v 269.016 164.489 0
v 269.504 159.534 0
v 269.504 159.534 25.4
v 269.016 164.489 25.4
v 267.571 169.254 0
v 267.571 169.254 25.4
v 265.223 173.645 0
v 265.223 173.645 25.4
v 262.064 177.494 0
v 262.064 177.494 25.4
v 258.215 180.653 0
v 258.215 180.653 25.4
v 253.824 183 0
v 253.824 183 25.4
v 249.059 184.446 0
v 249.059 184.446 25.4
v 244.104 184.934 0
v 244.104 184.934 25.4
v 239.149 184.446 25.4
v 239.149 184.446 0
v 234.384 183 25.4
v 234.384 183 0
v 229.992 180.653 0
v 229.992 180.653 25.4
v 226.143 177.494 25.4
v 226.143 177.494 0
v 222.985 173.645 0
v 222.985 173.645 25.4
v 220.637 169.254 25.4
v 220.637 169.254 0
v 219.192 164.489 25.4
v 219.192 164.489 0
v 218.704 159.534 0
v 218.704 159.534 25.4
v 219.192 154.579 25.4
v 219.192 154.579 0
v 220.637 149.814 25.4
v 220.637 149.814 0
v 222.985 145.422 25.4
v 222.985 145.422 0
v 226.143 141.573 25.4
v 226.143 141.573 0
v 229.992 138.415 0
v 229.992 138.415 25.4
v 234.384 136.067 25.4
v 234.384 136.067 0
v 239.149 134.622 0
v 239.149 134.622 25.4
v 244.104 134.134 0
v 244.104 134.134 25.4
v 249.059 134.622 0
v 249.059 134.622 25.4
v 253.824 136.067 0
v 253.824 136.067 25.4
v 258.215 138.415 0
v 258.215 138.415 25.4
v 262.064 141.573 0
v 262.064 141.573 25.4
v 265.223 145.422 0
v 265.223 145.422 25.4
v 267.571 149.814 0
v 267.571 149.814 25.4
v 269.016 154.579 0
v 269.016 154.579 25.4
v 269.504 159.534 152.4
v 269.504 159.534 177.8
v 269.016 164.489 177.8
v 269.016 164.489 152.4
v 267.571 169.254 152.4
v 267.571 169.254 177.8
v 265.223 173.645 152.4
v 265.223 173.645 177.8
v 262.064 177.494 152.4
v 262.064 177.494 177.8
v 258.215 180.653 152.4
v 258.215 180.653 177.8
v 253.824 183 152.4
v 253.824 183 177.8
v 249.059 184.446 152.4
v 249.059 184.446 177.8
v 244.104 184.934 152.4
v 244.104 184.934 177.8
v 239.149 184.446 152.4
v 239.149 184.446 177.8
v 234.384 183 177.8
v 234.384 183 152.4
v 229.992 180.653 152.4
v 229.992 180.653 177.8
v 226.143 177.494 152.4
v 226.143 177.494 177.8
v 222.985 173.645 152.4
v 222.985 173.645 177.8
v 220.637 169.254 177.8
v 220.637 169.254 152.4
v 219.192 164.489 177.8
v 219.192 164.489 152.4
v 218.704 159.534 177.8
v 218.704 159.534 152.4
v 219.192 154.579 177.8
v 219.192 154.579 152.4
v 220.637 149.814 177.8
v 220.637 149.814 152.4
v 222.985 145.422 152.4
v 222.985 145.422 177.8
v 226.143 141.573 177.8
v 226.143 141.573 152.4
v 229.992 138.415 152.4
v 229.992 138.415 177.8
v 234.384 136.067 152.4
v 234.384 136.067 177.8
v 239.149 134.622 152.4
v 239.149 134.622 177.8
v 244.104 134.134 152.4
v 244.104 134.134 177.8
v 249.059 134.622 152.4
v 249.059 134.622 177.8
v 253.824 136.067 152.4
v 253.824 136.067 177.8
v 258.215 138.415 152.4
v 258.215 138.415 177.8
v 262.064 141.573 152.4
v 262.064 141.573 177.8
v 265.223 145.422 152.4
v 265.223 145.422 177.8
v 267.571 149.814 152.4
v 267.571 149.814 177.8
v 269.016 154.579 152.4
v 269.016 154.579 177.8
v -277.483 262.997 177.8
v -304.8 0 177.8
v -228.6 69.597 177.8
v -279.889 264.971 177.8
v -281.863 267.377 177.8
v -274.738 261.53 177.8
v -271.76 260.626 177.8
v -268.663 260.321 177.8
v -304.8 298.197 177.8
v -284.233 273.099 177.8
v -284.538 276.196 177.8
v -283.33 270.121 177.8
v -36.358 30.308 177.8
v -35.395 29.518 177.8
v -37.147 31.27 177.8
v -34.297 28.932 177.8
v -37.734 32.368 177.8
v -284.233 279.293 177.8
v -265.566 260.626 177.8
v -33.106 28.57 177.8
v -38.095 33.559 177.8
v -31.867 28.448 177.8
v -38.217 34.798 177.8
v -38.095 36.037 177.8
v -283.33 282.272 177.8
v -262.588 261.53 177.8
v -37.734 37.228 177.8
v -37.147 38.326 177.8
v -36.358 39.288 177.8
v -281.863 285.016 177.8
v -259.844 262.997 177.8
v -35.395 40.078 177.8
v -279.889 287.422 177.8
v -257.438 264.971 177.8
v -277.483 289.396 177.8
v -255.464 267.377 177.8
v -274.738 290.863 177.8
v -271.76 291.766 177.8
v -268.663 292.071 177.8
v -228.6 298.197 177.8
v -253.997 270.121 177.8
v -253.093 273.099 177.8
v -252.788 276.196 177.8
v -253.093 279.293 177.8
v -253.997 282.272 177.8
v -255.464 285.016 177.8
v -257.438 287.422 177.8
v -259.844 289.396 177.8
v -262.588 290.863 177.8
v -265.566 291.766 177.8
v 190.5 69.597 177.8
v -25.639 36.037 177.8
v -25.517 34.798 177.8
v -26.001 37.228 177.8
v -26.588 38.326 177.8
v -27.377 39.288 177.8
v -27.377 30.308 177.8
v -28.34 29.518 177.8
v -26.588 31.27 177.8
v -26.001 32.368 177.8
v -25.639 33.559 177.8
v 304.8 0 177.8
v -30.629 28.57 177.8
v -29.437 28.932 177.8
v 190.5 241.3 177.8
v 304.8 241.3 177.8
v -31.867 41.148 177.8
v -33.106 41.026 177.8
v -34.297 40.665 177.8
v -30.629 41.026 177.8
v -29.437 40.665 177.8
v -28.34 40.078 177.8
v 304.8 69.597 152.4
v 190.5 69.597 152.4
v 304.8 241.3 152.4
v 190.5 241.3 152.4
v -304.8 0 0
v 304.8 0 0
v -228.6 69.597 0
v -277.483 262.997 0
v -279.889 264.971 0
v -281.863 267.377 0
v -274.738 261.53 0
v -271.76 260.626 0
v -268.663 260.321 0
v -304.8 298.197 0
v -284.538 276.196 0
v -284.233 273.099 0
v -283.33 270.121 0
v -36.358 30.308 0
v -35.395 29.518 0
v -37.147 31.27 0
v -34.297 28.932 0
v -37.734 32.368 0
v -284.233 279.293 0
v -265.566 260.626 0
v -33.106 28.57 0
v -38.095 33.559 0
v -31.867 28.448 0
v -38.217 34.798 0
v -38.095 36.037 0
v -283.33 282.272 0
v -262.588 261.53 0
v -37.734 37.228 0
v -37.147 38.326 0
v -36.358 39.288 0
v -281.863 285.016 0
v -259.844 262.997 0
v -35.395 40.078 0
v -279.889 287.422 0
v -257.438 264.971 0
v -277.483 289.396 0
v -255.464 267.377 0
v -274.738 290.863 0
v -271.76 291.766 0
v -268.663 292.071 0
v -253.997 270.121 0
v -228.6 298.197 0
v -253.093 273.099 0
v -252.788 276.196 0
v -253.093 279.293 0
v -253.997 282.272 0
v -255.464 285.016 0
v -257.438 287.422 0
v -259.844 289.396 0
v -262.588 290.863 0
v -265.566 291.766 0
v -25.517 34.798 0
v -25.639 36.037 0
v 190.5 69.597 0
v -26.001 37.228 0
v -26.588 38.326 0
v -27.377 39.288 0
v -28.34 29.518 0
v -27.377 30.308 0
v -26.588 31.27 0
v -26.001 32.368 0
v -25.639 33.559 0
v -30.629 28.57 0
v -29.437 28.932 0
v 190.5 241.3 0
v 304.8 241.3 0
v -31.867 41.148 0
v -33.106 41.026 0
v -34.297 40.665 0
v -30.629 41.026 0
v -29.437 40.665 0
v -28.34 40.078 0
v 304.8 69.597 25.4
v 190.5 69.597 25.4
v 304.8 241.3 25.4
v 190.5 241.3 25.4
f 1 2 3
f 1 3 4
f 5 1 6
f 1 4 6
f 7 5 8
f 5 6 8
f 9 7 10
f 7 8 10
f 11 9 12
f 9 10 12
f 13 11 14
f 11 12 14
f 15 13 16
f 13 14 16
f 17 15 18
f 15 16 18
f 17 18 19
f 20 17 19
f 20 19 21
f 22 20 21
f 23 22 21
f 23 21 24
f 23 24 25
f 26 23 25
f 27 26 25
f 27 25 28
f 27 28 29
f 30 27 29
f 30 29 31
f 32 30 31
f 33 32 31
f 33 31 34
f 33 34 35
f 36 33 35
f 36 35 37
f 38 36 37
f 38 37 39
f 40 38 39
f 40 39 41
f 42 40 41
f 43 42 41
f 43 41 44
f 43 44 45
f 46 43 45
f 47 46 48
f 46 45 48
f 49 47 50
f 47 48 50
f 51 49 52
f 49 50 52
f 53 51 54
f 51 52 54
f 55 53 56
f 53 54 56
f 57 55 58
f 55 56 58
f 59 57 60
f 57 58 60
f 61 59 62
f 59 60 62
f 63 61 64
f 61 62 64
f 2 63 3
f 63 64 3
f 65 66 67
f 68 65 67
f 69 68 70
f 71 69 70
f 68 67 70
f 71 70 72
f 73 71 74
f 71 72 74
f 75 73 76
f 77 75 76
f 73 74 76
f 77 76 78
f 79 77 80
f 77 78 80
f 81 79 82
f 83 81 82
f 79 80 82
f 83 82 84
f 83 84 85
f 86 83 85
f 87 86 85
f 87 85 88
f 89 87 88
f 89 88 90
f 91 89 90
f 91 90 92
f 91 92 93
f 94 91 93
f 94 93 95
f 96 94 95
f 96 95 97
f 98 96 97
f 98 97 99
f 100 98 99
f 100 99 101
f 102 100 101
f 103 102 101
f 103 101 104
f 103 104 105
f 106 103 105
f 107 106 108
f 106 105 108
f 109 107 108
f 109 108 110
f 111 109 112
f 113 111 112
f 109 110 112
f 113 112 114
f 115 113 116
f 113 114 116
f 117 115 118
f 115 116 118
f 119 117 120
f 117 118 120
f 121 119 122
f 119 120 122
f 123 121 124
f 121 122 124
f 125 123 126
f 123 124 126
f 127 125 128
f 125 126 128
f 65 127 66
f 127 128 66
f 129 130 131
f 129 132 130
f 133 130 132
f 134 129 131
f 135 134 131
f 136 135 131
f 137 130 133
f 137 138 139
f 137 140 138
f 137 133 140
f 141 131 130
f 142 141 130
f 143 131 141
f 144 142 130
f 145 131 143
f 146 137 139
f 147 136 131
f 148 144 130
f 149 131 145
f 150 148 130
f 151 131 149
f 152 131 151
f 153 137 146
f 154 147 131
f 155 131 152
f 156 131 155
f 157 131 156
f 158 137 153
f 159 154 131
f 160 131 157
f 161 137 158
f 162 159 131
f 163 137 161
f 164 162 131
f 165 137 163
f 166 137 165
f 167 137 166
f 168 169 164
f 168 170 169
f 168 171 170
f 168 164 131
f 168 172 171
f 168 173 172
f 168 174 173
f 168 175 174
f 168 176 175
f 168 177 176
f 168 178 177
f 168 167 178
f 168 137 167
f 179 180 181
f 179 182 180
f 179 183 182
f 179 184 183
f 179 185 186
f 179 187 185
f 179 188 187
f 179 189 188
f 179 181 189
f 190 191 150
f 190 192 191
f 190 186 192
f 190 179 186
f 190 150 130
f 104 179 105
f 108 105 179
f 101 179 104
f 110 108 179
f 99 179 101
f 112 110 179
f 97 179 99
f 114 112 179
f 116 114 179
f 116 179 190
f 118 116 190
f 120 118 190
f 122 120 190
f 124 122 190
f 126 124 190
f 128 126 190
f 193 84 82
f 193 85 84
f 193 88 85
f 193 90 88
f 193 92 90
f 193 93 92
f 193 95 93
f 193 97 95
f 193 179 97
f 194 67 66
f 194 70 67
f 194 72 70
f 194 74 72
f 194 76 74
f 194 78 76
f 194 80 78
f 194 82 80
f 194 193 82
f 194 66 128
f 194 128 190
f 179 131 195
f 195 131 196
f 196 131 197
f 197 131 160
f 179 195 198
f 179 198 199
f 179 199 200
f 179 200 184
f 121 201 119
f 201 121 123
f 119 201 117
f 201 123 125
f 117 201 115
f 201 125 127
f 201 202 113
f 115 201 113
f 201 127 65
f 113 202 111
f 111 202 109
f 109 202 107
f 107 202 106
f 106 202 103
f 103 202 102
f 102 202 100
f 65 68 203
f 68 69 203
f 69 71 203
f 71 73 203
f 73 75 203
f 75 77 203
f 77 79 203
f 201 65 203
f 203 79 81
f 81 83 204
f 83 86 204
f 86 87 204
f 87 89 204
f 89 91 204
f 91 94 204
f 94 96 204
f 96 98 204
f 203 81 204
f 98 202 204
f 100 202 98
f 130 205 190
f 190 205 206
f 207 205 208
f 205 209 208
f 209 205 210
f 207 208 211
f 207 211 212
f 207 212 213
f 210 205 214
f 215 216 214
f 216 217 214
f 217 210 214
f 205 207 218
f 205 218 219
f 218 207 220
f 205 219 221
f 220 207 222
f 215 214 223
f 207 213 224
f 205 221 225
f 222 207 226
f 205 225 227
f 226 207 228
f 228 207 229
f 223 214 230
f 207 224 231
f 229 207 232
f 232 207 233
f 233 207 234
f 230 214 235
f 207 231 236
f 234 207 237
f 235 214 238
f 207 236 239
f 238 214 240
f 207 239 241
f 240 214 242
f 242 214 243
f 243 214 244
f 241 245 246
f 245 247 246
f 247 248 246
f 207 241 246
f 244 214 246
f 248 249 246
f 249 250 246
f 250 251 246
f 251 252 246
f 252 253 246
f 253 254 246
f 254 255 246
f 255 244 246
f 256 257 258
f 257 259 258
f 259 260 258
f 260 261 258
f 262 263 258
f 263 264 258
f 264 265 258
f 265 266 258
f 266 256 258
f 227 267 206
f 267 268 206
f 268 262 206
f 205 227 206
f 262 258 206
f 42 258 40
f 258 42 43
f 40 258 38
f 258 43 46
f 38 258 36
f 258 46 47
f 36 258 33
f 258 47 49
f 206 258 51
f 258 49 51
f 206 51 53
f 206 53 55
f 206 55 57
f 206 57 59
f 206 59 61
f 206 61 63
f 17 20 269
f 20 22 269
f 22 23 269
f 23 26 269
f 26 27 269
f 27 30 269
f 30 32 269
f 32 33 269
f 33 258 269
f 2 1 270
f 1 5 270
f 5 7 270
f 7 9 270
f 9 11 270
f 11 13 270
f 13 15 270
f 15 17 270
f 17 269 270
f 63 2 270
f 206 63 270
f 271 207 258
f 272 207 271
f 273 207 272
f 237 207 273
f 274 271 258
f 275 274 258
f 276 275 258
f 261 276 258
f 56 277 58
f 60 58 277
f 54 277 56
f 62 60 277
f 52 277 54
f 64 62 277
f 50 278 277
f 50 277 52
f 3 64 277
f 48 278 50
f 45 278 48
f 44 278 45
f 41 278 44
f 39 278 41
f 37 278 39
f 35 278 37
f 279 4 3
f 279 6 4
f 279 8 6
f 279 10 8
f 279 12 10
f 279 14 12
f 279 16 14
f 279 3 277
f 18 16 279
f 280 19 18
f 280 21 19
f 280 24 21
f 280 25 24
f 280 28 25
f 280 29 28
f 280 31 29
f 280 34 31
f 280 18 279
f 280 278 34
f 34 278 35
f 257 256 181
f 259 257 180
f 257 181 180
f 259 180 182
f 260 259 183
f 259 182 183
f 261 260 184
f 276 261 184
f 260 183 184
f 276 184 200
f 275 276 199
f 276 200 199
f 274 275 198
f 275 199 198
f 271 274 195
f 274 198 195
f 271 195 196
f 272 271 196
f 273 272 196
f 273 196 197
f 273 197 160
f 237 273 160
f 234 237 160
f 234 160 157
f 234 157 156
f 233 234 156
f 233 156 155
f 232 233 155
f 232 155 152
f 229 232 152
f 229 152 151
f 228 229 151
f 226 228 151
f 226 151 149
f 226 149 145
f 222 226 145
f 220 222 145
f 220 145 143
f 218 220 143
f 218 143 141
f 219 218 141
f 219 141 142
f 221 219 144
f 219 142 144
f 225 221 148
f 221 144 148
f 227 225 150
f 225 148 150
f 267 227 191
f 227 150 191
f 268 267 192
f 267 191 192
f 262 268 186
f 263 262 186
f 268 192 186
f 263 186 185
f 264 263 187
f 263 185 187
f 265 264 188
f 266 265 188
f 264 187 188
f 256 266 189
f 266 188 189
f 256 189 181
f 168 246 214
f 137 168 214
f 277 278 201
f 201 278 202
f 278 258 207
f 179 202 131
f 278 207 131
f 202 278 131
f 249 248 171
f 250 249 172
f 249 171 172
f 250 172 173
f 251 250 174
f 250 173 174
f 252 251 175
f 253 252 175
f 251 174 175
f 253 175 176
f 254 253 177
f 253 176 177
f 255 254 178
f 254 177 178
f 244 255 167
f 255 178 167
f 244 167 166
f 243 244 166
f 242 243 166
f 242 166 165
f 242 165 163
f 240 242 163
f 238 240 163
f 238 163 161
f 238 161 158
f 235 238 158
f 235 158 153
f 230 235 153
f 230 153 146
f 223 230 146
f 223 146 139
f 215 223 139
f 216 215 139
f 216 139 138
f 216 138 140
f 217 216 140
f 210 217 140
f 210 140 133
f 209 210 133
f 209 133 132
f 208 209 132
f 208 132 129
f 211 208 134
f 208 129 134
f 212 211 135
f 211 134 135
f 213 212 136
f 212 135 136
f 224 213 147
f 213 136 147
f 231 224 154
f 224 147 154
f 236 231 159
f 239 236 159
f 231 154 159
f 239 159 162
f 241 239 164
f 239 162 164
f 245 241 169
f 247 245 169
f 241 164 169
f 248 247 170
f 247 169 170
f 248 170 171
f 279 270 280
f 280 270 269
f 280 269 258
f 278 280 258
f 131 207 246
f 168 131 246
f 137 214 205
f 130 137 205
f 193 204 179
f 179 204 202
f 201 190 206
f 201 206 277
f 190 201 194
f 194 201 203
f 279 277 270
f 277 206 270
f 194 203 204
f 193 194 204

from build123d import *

# Parameters (mm, degrees)
BOSS_EXTRUDE1_DEPTH = 177.8
SKETCH4_R           = 25.4
SKETCH4_R_2         = 15.875
SKETCH4_R_3         = 6.35
CUT_EXTRUDE1_DEPTH  = 462.992536298
SKETCH5_W           = 127
SKETCH5_H           = 171.70338098
CUT_EXTRUDE2_DEPTH  = 605.86044142


with BuildPart() as part:
    # Sketch1 → Boss-Extrude1 (new body)
    with BuildSketch(Plane.XY):
        Polygon((-304.8, 0), (304.8, 0), (304.8, 241.3), (190.5, 241.3), (190.5, 69.59661902), (-228.6, 69.59661902), (-228.6, 298.19661902), (-304.8, 298.19661902), align=None)
    extrude(amount=BOSS_EXTRUDE1_DEPTH)

    # Sketch4 → Cut-Extrude1 (cut, through all)
    with BuildSketch(Plane.XY.offset(177.8)):
        with Locations((244.103977456, 159.533856411)):
            Circle(SKETCH4_R)
        with Locations((-268.663213375, 276.196433082)):
            Circle(SKETCH4_R_2)
        with Locations((-31.867387375, 34.79830951)):
            Circle(SKETCH4_R_3)
    extrude(amount=-CUT_EXTRUDE1_DEPTH, mode=Mode.SUBTRACT)

    # Sketch5 → Cut-Extrude2 (cut, through all)
    with BuildSketch(Plane.ZY.offset(-190.5)):
        with Locations((88.9, 155.44830951)):
            Rectangle(SKETCH5_W, SKETCH5_H)
    extrude(amount=-CUT_EXTRUDE2_DEPTH, mode=Mode.SUBTRACT)


solid = part.part
